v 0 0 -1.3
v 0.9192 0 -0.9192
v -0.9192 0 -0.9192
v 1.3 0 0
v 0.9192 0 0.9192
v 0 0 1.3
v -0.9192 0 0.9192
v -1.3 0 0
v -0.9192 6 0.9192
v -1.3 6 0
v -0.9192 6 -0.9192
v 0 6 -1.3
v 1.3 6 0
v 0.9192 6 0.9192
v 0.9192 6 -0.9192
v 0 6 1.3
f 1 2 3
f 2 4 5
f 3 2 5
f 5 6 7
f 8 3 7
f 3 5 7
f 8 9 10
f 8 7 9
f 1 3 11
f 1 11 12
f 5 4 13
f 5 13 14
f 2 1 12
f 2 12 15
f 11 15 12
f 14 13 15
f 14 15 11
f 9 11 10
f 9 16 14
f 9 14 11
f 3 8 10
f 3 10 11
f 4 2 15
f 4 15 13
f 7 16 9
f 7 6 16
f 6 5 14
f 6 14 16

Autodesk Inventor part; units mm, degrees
ref_plane "YZ Plane" through (0, 0, 0) normal (1, 0, 0) x (0, 1, 0)
ref_plane "XZ Plane" through (0, 0, 0) normal (0, 1, 0) x (-1, 0, 0)
ref_plane "XY Plane" through (0, 0, 0) normal (0, 0, 1) x (1, 0, 0)
sketch "Sketch1" plane through (0, 0, 0) normal (0, 1, 0) x (-1, 0, 0)
  circle A0 centre (0, 0) radius 1.3 construction
  line L0 (1.3, 0) -> (0.9192, -0.9192)
  line L1 (0.9192, -0.9192) -> (0, -1.3)
  line L2 (0, -1.3) -> (-0.9192, -0.9192)
  line L3 (-0.9192, -0.9192) -> (-1.3, 0)
  line L4 (-1.3, 0) -> (-0.9192, 0.9192)
  line L5 (-0.9192, 0.9192) -> (0, 1.3)
  line L6 (0, 1.3) -> (0.9192, 0.9192)
  line L7 (0.9192, 0.9192) -> (1.3, 0)
  dimension "d0" = 2.6
extrude "Extrusion1" add sketch "Sketch1" along normal blind 6
properties part number "pin_4mm"
